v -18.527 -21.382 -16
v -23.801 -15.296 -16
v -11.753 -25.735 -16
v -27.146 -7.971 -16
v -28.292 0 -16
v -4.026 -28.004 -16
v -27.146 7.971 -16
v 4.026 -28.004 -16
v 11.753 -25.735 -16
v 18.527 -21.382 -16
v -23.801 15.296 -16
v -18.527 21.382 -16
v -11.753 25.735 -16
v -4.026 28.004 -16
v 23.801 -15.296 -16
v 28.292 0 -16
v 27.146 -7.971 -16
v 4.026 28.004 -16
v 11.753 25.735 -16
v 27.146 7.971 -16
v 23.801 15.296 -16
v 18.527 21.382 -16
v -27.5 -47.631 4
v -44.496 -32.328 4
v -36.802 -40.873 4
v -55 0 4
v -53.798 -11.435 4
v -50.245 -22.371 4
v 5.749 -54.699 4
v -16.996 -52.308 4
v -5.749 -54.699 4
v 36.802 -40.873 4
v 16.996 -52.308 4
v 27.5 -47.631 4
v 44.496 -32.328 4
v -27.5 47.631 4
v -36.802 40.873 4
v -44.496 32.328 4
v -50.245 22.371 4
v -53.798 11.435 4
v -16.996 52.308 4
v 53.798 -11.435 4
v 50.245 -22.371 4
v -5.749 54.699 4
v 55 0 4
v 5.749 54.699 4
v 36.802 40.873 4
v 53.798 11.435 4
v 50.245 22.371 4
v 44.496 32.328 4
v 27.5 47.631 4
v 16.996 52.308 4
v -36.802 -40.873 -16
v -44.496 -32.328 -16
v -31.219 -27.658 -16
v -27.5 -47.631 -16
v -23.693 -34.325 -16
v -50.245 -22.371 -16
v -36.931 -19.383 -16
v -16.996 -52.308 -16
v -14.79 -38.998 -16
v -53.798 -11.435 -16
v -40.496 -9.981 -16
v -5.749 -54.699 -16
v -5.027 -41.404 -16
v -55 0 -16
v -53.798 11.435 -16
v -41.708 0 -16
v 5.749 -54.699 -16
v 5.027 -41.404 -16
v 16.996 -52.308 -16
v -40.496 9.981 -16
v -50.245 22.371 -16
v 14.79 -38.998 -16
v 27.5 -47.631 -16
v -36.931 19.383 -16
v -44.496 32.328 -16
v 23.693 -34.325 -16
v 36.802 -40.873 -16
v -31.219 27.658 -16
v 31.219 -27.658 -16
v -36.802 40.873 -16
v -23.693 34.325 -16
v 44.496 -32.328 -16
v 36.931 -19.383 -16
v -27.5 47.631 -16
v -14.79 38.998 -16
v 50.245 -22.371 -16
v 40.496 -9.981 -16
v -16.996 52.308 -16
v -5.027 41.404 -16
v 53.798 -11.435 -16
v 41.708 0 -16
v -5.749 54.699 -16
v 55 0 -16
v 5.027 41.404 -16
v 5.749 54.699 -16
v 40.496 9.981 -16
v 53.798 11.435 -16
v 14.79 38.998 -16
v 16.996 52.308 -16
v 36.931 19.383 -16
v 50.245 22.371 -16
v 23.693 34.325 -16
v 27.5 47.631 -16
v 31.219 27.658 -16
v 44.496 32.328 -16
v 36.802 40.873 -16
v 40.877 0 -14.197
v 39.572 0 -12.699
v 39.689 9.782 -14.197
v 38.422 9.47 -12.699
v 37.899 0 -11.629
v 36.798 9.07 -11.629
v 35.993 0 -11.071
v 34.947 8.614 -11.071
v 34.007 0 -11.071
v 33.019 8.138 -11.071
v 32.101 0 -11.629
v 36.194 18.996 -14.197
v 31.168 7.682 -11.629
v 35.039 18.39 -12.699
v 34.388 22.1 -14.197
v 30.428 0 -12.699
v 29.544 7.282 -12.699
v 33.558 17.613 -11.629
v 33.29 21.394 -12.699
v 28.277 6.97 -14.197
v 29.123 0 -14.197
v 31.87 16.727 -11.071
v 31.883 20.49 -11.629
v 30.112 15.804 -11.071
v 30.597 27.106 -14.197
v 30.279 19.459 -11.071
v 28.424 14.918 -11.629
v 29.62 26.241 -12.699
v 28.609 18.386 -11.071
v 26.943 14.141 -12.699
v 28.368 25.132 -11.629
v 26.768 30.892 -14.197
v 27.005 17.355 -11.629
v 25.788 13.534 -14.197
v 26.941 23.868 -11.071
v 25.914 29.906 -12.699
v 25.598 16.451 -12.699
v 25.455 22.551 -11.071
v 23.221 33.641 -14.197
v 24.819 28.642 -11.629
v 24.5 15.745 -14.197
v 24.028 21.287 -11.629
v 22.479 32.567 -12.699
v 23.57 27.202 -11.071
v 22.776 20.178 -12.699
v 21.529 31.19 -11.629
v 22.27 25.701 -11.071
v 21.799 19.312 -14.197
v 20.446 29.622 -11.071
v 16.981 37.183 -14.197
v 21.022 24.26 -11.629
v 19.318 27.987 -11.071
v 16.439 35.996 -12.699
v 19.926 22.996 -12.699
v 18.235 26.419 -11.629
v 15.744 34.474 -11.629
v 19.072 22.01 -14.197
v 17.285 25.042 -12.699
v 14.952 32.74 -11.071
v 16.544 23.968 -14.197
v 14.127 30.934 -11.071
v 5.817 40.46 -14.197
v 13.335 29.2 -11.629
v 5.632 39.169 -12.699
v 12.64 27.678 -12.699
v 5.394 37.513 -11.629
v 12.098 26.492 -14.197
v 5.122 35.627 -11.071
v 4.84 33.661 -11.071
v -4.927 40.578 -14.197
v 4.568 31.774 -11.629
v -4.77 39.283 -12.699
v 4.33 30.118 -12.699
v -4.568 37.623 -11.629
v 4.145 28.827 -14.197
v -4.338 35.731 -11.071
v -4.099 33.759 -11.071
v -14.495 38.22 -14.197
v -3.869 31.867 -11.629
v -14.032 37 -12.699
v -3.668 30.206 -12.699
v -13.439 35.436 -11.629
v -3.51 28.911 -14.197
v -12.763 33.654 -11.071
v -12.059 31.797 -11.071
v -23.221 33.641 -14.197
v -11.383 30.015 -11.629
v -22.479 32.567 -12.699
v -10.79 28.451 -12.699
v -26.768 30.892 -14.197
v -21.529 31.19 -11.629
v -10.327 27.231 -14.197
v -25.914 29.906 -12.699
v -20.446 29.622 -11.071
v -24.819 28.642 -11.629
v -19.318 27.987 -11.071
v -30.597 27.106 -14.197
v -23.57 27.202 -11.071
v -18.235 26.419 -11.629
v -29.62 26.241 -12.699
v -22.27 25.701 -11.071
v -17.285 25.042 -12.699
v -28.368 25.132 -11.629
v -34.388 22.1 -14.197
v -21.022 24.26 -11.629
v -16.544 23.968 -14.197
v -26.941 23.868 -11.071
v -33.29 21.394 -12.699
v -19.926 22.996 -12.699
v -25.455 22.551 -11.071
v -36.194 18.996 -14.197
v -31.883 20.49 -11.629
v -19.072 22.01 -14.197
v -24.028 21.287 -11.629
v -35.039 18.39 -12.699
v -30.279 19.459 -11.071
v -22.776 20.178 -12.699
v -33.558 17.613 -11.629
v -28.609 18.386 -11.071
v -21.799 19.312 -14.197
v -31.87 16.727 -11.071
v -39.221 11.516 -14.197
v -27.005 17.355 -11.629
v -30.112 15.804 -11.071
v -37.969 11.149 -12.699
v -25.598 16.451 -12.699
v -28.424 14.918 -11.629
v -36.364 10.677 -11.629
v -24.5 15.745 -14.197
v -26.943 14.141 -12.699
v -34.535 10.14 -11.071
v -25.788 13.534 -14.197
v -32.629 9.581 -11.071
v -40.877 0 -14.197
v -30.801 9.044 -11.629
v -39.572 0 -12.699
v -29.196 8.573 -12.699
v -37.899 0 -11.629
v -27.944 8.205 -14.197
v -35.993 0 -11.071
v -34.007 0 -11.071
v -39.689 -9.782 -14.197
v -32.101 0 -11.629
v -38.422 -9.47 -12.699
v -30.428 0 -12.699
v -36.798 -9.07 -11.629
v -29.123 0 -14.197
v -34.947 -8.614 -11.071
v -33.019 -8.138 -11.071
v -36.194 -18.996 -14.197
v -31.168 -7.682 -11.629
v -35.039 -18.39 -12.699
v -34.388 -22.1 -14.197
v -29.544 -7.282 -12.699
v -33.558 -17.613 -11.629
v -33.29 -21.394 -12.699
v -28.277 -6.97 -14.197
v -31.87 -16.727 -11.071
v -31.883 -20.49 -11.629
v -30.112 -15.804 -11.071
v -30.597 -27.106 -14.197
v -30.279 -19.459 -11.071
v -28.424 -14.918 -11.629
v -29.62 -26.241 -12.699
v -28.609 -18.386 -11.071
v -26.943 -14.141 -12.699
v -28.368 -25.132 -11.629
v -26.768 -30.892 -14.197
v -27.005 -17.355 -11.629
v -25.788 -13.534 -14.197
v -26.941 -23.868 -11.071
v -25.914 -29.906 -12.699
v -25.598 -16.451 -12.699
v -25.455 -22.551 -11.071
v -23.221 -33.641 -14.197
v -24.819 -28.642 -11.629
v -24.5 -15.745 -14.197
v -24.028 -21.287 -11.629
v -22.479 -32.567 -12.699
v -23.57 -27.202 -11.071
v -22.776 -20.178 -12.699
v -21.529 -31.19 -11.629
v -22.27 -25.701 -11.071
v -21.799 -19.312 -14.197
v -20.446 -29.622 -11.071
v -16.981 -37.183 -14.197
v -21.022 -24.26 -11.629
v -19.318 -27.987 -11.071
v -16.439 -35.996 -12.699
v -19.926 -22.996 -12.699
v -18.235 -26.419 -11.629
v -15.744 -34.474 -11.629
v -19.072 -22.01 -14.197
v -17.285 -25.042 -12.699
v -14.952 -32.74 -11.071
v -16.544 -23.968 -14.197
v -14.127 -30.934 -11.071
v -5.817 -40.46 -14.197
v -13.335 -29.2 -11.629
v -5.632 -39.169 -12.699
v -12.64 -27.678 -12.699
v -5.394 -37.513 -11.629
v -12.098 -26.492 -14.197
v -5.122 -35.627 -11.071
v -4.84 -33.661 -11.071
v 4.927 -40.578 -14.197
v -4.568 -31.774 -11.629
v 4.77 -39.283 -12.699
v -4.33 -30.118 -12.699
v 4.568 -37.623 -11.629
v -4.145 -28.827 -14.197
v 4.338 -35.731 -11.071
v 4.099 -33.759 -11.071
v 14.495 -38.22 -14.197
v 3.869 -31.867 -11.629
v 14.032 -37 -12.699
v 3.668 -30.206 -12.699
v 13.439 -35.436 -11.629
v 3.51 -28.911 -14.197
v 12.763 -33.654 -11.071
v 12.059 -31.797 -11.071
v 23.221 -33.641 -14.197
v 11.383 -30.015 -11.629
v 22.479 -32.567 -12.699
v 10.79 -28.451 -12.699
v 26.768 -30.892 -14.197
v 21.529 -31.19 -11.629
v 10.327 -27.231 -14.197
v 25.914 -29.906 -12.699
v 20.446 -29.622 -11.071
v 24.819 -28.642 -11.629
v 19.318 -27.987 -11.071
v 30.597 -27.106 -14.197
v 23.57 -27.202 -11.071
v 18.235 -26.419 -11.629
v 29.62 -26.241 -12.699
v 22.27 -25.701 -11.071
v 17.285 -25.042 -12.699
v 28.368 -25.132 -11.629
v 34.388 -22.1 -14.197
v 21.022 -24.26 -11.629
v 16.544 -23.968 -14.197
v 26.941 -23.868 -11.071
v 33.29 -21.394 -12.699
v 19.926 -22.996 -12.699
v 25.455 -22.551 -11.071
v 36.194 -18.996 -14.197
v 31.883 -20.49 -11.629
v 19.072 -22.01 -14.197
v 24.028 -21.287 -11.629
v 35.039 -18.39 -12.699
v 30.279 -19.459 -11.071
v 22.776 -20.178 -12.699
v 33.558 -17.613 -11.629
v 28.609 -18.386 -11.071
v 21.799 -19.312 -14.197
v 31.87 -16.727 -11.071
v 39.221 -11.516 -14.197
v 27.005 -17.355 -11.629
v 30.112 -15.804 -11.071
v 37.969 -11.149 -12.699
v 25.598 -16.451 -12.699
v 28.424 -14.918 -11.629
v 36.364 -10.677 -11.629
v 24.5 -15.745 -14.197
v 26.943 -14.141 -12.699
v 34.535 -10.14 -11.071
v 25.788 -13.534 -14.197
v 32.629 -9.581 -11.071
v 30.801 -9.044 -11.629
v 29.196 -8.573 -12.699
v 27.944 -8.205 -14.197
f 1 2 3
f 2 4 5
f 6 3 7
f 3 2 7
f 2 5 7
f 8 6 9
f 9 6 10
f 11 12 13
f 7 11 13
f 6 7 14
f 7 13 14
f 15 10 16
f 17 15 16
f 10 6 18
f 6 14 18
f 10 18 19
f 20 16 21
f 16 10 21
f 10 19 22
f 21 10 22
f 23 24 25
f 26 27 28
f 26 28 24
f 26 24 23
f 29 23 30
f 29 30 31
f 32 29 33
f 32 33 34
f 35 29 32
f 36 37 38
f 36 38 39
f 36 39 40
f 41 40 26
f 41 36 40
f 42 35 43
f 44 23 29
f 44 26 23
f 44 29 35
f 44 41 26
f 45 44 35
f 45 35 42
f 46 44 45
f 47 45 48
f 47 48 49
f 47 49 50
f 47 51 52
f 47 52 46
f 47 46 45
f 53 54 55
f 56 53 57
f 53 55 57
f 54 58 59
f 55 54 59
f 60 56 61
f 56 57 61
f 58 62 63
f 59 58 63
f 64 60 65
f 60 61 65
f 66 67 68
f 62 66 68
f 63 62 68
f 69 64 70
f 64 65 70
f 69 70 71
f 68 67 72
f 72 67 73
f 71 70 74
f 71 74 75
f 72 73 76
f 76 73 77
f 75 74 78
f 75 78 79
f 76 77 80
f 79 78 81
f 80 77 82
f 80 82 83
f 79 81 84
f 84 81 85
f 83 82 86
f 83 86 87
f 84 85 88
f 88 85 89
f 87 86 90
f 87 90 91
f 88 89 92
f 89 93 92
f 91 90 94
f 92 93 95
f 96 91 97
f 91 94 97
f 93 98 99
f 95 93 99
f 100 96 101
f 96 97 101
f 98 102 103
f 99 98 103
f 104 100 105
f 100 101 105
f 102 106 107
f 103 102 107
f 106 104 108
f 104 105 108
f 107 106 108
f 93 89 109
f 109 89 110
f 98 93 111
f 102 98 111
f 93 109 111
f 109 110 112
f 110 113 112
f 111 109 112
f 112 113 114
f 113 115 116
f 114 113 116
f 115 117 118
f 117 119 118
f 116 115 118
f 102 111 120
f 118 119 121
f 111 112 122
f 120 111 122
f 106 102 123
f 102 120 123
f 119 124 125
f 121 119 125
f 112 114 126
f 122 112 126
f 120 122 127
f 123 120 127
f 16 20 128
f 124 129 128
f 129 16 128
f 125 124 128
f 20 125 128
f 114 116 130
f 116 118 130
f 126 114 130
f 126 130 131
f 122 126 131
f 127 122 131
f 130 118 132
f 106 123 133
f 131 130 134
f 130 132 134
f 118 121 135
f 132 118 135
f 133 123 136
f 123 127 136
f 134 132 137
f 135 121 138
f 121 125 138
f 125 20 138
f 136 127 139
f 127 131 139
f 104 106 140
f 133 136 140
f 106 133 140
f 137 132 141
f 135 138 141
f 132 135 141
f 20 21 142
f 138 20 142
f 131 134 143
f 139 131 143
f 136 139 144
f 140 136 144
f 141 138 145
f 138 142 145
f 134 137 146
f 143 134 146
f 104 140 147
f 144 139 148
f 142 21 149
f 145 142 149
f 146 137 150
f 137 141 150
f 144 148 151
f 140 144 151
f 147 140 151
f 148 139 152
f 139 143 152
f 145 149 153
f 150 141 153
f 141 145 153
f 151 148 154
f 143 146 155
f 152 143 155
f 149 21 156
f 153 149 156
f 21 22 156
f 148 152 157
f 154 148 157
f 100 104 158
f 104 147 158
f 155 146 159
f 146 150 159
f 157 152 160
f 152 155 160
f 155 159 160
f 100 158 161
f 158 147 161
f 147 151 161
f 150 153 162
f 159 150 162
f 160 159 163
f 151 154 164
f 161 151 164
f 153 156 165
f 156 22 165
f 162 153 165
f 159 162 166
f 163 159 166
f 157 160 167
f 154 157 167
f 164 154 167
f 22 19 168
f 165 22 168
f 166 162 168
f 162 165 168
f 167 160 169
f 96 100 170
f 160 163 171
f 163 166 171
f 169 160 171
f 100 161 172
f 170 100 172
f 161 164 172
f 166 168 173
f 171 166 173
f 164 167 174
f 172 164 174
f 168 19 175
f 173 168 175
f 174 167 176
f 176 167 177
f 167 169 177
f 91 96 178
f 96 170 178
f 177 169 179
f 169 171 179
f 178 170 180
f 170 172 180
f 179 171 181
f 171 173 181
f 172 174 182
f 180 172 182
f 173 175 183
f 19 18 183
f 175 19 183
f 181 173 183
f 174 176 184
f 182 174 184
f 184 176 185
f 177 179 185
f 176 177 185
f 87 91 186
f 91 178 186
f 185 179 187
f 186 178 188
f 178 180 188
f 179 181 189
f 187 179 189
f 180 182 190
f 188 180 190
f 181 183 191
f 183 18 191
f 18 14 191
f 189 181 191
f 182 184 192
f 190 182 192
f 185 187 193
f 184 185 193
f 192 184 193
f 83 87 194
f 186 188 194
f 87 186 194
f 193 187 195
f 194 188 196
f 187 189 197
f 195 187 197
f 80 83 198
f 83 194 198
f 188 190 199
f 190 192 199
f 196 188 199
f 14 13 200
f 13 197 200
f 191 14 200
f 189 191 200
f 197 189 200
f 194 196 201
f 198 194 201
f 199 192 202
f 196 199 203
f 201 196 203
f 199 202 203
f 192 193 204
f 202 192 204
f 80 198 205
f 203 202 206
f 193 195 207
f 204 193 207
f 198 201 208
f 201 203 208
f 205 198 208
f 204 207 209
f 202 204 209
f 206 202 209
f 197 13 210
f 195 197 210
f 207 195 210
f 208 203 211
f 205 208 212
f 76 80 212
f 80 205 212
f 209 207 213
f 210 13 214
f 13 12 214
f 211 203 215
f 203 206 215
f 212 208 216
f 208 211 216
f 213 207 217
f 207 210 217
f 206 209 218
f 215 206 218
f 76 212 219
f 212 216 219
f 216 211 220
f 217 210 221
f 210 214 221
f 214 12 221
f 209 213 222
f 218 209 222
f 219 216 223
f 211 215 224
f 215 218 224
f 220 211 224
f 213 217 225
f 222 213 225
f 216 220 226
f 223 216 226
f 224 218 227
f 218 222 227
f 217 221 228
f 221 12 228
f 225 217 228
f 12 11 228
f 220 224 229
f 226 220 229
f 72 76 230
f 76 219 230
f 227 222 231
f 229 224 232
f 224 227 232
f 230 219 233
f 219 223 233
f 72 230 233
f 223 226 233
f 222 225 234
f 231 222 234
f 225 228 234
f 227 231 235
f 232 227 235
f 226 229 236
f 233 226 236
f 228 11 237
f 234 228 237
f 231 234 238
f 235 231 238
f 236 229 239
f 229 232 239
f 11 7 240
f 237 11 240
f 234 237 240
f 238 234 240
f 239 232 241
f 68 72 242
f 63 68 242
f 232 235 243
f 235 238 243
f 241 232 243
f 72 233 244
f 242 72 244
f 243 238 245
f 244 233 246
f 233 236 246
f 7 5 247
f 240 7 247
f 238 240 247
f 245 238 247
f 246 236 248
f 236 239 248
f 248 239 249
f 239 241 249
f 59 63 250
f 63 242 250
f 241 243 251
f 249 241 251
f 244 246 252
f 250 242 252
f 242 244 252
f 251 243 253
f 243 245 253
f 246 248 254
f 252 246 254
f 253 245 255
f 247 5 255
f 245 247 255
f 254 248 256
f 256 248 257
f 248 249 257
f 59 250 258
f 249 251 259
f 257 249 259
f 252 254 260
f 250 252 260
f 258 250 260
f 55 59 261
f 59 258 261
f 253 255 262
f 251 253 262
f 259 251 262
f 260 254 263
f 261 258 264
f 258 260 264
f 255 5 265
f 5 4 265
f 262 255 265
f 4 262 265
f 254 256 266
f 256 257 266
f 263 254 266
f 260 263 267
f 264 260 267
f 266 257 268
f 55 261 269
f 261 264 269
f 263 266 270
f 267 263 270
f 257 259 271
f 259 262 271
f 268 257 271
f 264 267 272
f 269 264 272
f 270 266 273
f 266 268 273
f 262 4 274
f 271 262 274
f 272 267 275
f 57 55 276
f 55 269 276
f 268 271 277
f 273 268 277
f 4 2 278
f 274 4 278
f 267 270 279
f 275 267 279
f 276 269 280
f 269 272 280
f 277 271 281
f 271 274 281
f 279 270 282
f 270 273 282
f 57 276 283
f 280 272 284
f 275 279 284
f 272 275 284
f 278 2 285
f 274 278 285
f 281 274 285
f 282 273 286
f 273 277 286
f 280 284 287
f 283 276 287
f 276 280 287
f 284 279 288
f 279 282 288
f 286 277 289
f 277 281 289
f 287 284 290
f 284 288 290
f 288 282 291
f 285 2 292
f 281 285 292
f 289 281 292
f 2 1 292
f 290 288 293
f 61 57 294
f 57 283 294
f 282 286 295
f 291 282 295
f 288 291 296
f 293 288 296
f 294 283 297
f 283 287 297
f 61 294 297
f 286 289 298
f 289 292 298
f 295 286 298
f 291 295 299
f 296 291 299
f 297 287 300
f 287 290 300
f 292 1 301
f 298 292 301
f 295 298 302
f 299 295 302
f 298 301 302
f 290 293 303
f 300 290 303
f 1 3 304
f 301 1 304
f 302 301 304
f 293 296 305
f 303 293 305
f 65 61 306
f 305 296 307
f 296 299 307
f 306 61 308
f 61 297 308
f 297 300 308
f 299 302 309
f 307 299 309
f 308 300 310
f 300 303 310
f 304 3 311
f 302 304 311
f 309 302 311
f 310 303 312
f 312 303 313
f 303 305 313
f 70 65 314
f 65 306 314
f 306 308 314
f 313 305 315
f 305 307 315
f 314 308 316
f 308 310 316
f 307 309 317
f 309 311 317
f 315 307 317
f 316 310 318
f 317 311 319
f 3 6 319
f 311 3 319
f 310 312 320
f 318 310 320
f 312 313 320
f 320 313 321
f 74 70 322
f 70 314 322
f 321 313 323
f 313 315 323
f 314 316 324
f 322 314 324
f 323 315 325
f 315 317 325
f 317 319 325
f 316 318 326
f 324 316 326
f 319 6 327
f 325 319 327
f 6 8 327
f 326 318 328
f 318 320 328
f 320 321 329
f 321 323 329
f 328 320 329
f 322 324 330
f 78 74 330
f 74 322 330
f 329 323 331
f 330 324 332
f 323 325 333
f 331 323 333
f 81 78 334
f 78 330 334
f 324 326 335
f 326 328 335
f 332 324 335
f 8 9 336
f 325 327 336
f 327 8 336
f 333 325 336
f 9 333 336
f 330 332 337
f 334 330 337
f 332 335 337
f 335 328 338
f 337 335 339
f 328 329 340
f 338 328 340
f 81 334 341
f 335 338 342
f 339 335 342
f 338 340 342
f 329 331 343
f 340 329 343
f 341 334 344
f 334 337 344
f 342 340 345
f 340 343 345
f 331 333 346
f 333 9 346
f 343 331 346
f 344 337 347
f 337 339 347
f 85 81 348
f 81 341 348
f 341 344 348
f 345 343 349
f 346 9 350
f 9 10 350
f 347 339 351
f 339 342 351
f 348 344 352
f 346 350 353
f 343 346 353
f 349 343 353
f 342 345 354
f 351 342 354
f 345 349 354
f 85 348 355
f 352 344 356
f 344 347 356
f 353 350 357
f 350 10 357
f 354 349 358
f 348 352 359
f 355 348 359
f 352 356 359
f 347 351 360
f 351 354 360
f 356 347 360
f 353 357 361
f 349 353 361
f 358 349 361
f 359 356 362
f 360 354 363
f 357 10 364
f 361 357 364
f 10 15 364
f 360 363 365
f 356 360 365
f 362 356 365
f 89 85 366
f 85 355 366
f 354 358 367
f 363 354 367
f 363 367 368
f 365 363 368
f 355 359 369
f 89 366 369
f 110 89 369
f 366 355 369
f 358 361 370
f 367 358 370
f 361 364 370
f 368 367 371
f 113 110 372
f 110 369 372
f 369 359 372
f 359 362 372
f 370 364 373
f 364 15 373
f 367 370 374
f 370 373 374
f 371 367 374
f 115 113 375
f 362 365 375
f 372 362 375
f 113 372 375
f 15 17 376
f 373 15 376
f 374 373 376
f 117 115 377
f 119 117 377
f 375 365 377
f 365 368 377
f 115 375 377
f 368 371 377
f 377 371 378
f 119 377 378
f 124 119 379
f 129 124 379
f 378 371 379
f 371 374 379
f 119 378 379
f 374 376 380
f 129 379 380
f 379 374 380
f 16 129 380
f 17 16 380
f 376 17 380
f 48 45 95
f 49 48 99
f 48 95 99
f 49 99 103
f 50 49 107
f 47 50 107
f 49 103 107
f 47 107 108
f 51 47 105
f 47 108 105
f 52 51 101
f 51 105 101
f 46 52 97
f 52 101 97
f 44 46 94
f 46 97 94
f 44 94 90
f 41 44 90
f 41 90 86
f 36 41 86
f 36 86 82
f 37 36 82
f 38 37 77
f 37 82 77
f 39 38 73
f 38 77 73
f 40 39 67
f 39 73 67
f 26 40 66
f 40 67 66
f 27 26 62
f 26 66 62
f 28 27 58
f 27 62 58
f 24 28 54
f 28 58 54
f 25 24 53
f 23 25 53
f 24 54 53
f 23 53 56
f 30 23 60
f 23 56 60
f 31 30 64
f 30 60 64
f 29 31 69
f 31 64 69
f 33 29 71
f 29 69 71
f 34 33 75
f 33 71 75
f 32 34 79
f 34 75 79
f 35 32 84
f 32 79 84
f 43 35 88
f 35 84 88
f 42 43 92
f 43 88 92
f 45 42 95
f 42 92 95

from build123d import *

# Parameters (mm, degrees)
TORUS_R        = 7
CYLINDER_R     = 55
CYLINDER_DEPTH = 20


with BuildPart() as torus:
    # Torus → Torus (revolve)
    with BuildSketch(Plane(origin=(0, 0, -18), x_dir=(1, 0, 0), z_dir=(0, -1, 0))):
        with Locations((35, 0)):
            Circle(TORUS_R)
    revolve(axis=Axis((0, 0, -18), (0, 0, 1)))


with BuildPart() as cut001:
    # Cylinder → Cylinder (new body)
    with BuildSketch(Plane.XY.offset(-16)):
        Circle(CYLINDER_R)
    extrude(amount=CYLINDER_DEPTH)

    # Cut001: cut Torus
    add(torus.part, mode=Mode.SUBTRACT)


solid = cut001.part
